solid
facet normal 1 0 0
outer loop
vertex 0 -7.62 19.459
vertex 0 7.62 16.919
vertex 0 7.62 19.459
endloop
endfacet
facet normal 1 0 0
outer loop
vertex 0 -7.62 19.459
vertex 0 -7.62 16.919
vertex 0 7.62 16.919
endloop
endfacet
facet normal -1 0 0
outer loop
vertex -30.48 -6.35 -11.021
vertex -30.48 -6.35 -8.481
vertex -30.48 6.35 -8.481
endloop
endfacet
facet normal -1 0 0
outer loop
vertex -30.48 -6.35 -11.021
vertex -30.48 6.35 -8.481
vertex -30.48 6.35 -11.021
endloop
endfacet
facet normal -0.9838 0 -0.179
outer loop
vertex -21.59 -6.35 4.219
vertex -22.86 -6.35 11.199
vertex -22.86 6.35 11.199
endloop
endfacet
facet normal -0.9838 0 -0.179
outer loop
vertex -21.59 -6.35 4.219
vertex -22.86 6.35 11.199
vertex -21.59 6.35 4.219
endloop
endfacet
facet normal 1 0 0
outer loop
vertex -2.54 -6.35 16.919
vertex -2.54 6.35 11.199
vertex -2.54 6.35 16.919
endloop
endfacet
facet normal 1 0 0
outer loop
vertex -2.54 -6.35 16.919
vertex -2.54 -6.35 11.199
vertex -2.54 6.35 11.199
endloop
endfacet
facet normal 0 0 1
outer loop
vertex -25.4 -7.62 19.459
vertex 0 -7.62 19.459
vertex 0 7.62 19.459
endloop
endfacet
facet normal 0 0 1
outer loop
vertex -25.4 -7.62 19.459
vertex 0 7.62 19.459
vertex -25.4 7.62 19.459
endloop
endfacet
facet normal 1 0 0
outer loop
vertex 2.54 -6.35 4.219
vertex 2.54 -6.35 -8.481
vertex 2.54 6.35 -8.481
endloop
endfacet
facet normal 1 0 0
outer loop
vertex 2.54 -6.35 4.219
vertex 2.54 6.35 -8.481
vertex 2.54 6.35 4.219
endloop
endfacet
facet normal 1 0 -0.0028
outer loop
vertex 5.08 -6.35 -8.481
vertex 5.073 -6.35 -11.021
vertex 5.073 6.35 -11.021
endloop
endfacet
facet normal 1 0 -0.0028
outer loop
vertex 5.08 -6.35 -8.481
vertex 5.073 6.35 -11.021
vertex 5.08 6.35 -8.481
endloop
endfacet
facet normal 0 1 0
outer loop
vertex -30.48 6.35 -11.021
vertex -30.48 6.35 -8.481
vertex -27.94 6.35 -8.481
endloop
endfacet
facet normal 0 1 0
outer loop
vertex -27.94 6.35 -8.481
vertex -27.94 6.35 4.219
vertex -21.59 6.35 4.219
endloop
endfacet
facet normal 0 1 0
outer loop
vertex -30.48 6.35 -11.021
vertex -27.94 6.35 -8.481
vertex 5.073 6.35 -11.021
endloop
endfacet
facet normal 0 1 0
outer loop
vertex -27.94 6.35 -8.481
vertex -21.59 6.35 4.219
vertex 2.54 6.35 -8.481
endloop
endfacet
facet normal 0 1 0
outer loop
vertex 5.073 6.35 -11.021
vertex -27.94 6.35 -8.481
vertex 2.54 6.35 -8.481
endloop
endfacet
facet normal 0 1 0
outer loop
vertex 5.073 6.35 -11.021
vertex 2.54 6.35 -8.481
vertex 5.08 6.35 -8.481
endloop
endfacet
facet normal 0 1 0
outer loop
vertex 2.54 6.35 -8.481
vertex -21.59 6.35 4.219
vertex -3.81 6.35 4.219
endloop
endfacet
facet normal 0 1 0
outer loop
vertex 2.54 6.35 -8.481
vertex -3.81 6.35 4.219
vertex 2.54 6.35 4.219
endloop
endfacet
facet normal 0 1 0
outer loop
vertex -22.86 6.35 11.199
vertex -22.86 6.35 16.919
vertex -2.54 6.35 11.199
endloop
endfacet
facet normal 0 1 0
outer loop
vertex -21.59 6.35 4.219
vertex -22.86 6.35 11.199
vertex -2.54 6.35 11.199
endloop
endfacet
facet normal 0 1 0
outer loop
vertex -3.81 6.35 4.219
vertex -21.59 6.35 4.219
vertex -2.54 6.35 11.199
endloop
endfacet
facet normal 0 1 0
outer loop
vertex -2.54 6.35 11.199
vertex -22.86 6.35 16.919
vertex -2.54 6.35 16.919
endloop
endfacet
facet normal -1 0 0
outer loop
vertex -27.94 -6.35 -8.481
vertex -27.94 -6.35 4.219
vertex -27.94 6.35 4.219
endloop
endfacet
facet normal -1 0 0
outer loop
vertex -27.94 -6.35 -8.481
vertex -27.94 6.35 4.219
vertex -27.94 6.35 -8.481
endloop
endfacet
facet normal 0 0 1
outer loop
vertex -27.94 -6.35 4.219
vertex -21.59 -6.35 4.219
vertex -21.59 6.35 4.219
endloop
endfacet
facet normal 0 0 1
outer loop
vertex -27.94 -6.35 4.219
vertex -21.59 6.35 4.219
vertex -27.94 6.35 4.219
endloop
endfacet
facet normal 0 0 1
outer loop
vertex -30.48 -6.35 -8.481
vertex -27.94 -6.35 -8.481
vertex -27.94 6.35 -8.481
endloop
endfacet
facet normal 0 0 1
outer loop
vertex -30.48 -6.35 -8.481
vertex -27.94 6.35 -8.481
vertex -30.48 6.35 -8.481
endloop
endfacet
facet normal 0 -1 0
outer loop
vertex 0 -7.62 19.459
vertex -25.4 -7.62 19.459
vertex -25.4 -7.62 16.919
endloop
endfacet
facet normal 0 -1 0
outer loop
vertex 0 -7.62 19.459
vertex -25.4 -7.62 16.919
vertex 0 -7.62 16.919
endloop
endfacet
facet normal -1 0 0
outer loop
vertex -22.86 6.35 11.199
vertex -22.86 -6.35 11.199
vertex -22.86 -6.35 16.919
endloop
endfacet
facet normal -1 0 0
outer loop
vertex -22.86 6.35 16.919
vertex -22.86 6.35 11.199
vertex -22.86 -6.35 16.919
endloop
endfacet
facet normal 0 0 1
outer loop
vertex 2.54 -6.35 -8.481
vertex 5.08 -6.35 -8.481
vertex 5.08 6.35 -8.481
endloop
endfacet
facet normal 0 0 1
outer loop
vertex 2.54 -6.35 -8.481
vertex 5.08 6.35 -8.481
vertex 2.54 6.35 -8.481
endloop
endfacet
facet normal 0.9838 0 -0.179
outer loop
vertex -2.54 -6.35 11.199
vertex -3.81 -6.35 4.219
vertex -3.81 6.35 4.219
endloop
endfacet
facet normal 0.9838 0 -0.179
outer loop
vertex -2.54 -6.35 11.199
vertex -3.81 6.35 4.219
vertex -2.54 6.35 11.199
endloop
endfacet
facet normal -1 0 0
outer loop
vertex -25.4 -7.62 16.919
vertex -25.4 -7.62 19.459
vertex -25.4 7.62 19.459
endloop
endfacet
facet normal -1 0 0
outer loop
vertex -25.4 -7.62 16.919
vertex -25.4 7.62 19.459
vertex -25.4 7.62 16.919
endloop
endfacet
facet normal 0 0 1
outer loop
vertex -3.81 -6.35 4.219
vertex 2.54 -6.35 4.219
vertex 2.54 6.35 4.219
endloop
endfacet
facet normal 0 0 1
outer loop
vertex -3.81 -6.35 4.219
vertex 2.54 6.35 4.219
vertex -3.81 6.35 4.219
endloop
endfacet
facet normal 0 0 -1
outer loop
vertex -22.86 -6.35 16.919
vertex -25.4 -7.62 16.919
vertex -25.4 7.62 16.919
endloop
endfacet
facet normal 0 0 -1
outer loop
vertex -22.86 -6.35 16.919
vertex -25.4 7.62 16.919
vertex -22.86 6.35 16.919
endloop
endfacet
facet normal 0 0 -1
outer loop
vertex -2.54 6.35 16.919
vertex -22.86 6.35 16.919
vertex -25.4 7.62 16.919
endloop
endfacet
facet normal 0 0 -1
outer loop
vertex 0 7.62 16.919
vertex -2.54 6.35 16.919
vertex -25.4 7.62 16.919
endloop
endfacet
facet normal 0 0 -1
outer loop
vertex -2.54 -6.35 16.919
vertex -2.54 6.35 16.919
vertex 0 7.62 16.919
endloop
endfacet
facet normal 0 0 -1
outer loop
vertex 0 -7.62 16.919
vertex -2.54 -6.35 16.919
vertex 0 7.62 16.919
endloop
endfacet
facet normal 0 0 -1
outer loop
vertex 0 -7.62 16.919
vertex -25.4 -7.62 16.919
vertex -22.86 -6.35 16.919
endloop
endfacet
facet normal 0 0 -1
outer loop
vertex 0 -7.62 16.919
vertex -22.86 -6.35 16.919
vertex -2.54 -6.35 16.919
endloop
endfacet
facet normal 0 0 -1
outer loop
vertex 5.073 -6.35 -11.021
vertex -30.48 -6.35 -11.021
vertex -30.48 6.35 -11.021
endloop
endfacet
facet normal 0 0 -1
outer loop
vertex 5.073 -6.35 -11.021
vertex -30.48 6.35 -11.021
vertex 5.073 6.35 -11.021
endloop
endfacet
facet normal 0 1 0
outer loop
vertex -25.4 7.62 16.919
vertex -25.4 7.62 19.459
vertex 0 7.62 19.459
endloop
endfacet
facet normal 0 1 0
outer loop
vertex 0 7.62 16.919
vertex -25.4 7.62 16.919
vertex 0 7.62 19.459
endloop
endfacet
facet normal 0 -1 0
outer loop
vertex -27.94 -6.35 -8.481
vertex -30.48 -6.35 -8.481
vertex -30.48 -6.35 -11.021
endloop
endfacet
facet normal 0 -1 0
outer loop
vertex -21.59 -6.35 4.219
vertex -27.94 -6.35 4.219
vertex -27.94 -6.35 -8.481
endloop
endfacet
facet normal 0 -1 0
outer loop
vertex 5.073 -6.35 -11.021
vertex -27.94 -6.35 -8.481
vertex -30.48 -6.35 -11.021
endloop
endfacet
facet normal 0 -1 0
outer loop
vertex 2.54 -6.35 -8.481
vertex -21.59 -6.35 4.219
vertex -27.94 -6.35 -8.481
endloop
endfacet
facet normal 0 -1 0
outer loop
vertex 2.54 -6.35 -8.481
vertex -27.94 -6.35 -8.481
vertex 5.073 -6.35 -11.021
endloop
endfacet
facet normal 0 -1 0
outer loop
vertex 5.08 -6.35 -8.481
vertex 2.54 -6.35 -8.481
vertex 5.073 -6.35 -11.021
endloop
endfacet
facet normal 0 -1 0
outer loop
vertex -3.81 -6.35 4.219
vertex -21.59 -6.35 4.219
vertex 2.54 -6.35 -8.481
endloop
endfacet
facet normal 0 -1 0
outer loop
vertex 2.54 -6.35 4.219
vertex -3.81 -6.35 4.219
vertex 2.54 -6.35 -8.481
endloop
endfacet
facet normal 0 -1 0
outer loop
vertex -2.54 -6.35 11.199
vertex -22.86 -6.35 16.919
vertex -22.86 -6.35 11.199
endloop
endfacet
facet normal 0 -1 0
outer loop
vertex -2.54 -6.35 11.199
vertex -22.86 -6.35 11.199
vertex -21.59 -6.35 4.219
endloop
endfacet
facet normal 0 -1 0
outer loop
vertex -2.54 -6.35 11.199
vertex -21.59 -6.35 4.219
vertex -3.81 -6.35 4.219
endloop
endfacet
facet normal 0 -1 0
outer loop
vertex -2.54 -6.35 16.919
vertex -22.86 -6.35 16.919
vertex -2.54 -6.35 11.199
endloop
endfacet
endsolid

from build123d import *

# Parameters (mm, degrees)
F0_W     = 10.16
F0_H     = 5.7193874504
F1_DEPTH = 6.35
F2_DEPTH = 7.62


with BuildPart() as f1:
    # F0 (on Front) → F1 (new body, symmetric)
    with BuildSketch(Plane.XZ):
        Polygon((0, 16.9185199898), (0, 19.4585199898), (-25.4, 19.4585199898), (-25.4, 16.9185199898), (-22.86, 16.9185199898), (-12.7, 16.9185199898), (-2.54, 16.9185199898), align=None)
        with Locations((-7.62, 14.0588262645)):
            Rectangle(F0_W, F0_H)
        with Locations((-17.78, 14.0588262645)):
            Rectangle(F0_W, F0_H)
        Polygon((-3.81, 4.2185199898), (-2.54, 11.1991325393), (-12.7, 11.1991325393), (-12.7, 4.2185199898), align=None)
        Polygon((-12.7, 11.1991325393), (-22.86, 11.1991325393), (-21.59, 4.2185199898), (-12.7, 4.2185199898), align=None)
        Polygon((2.54, 4.2185199898), (-3.81, 4.2185199898), (-12.7, 4.2185199898), (-12.7, -8.4814800102), (2.54, -8.4814800102), align=None)
        Polygon((-12.7, 4.2185199898), (-21.59, 4.2185199898), (-27.94, 4.2185199898), (-27.94, -8.4814800102), (-12.7, -8.4814800102), align=None)
        Polygon((2.54, -8.4814800102), (-12.7, -8.4814800102), (-27.94, -8.4814800102), (-30.48, -8.4814800102), (-30.48, -11.0214800102), (5.0727012567, -11.0214800102), (5.08, -8.4814800102), align=None)
    extrude(amount=F1_DEPTH, both=True)

    # F0 (on Front) → F2 (join, symmetric)
    with BuildSketch(Plane.XZ):
        Polygon((0, 16.9185199898), (0, 19.4585199898), (-25.4, 19.4585199898), (-25.4, 16.9185199898), (-22.86, 16.9185199898), (-12.7, 16.9185199898), (-2.54, 16.9185199898), align=None)
    extrude(amount=F2_DEPTH, both=True)


solid = f1.part
